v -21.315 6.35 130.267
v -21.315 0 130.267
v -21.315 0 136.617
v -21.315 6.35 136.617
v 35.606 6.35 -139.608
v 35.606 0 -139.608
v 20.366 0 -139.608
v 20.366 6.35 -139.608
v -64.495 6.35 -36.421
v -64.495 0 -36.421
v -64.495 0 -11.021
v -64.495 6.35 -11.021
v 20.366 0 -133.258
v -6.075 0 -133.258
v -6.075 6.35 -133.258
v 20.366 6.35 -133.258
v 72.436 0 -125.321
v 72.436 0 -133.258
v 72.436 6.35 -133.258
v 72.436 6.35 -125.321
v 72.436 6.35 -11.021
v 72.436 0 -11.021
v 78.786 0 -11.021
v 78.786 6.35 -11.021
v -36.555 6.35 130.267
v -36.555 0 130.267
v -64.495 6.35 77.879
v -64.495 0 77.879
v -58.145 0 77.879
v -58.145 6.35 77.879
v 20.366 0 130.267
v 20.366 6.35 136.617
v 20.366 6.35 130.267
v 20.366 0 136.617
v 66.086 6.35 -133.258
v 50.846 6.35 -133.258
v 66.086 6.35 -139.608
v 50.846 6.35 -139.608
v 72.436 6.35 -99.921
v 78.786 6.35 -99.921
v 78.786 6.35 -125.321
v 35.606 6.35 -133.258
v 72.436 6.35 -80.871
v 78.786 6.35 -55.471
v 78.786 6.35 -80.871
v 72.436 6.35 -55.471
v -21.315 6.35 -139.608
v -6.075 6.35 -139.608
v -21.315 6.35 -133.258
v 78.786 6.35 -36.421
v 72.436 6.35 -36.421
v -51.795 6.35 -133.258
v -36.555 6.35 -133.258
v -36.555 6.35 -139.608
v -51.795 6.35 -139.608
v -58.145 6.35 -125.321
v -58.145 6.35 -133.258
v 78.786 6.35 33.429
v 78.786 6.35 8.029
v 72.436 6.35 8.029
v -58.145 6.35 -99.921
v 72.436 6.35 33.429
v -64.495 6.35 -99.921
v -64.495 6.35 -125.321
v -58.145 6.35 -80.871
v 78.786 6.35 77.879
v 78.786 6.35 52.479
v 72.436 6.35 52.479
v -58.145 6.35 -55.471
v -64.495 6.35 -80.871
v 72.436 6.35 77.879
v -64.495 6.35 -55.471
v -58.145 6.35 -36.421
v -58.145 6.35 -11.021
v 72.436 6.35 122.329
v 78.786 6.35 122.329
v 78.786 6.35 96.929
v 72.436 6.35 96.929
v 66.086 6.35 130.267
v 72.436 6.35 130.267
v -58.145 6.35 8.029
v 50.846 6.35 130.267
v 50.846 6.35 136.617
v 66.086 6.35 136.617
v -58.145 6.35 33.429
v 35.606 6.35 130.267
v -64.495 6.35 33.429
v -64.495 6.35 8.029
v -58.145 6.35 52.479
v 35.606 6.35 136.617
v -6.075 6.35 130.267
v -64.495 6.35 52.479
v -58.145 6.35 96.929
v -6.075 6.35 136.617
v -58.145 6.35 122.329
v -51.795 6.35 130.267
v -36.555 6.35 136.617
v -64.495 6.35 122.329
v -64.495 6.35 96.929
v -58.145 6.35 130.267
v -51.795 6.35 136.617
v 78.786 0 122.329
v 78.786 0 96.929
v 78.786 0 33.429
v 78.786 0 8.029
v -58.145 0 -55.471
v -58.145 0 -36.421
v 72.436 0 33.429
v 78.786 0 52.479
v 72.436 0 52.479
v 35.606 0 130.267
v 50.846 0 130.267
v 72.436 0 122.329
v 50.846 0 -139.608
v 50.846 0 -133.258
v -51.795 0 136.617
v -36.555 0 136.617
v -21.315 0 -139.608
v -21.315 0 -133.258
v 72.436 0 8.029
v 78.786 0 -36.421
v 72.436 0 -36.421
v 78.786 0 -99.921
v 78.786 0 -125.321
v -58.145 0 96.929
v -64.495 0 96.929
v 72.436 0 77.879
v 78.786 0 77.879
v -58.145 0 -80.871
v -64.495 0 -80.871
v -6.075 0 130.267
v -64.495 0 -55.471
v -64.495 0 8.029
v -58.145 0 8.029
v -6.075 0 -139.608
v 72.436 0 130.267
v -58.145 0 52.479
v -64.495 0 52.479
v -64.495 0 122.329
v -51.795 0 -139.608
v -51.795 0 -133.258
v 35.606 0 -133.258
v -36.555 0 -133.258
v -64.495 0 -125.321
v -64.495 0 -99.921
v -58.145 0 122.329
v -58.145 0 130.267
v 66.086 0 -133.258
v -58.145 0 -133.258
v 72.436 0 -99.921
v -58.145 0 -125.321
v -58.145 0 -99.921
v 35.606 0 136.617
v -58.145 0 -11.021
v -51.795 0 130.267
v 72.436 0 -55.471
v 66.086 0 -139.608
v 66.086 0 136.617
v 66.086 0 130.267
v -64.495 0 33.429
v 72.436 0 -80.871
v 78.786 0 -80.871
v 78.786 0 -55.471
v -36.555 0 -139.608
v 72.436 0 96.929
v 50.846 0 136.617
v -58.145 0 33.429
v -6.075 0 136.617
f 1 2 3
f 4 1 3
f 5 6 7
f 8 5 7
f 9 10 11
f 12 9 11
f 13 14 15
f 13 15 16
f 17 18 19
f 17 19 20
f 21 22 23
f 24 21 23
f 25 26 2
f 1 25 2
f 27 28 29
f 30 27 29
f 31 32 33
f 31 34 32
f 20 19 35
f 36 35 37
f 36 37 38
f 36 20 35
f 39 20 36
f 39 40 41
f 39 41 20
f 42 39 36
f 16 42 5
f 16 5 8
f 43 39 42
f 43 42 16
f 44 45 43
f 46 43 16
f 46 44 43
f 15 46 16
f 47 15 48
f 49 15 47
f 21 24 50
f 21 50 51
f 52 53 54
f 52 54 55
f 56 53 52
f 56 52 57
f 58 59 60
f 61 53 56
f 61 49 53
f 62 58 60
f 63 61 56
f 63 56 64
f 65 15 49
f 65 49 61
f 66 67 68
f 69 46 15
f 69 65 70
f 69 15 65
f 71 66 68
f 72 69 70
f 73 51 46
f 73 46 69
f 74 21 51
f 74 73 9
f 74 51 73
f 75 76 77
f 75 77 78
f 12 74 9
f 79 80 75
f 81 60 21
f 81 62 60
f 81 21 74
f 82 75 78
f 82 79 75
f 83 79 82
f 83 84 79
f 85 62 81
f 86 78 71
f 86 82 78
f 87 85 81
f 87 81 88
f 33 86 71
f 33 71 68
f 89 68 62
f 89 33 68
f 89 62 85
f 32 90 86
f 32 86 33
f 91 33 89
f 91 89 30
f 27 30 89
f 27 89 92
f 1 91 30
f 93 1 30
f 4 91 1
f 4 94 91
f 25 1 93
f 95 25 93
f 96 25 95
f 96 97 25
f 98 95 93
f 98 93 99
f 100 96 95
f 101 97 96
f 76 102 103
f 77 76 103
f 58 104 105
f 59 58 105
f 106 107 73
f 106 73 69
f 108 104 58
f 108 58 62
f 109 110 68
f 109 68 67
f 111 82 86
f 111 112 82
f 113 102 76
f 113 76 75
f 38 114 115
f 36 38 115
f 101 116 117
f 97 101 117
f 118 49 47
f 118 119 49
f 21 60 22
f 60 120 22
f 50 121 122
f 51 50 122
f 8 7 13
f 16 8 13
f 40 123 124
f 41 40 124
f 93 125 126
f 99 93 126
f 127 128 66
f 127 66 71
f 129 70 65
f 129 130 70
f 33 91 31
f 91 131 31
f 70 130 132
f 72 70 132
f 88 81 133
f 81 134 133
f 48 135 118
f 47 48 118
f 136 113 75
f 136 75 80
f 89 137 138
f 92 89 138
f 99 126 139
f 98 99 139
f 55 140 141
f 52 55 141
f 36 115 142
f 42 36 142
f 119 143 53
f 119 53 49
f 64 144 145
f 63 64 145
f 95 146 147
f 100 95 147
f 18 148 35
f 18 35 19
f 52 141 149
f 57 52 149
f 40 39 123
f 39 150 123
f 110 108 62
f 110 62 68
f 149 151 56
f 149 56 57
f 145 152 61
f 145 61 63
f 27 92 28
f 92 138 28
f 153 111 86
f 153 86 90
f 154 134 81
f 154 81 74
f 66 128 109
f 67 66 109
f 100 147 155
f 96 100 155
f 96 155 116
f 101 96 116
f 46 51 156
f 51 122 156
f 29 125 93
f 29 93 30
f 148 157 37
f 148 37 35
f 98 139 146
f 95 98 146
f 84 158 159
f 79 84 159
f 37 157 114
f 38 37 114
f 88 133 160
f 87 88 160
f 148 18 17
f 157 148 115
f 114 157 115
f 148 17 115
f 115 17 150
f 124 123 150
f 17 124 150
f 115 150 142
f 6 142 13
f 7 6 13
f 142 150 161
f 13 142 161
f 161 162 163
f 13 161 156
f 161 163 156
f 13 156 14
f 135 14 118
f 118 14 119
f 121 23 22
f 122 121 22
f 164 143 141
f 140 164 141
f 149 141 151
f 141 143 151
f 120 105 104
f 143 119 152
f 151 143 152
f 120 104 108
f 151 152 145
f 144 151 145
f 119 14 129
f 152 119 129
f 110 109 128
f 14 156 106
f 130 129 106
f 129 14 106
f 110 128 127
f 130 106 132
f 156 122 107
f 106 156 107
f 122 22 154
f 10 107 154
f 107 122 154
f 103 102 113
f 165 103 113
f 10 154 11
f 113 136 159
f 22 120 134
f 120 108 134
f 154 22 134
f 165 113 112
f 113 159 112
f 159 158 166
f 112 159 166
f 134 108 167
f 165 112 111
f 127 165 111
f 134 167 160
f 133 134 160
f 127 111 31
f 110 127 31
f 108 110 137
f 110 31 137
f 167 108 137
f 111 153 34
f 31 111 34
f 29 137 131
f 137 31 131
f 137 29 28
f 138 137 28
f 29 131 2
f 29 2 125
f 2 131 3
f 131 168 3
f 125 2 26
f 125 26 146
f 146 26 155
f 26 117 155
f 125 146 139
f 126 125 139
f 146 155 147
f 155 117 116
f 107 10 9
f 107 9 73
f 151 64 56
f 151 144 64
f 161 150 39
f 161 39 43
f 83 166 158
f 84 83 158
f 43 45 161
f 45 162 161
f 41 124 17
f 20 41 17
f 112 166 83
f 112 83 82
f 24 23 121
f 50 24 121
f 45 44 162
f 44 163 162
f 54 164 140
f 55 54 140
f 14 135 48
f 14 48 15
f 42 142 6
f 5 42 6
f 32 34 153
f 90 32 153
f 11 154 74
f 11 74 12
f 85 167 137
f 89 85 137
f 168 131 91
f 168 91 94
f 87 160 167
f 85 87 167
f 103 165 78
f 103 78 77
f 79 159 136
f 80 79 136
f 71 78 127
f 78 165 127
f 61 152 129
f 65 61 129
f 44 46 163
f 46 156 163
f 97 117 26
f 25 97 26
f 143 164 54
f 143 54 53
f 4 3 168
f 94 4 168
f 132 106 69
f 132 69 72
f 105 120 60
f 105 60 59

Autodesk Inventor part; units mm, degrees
ref_plane "YZ Plane" through (0, 0, 0) normal (1, 0, 0) x (0, 1, 0)
ref_plane "XZ Plane" through (0, 0, 0) normal (0, 1, 0) x (-1, 0, 0)
ref_plane "XY Plane" through (0, 0, 0) normal (0, 0, 1) x (1, 0, 0)
sketch "Sketch1" plane through (0, 0, 0) normal (0, 1, 0) x (-1, 0, 0)
  line L0 (36.5552, 136.6167) -> (36.5552, 130.2667)
  line L1 (21.3152, 130.2667) -> (21.3152, 136.6167)
  line L2 (58.1452, 96.9292) -> (64.4952, 96.9292)
  line L3 (64.4952, 77.8792) -> (58.1452, 77.8792)
  line L4 (58.1452, 52.4792) -> (64.4952, 52.4792)
  line L5 (64.4952, 33.4292) -> (58.1452, 33.4292)
  line L6 (58.1452, 8.0292) -> (64.4952, 8.0292)
  line L7 (64.4952, -1.4958) -> (-62.2762, -1.4958) construction
  line L8 (-7.1455, 136.6167) -> (-7.1455, -139.6083) construction
  line L9 (58.1452, 96.9292) -> (58.1452, 77.8792)
  line L10 (58.1452, 33.4292) -> (58.1452, 52.4792)
  line L11 (36.5552, 130.2667) -> (21.3152, 130.2667)
  line L12 (-50.8462, 136.6167) -> (-50.8462, 130.2667)
  line L13 (-20.3662, 136.6167) -> (-20.3662, 130.2667)
  line L14 (-35.6062, 130.2667) -> (-35.6062, 136.6167)
  line L15 (-78.7862, 122.3292) -> (-72.4362, 122.3292)
  line L16 (-72.4362, 96.9292) -> (-78.7862, 96.9292)
  line L17 (-78.7862, 77.8792) -> (-72.4362, 77.8792)
  line L18 (-72.4362, 52.4792) -> (-78.7862, 52.4792)
  line L19 (-78.7862, 33.4292) -> (-72.4362, 33.4292)
  line L20 (-72.4362, 8.0292) -> (-78.7862, 8.0292)
  line L21 (-72.4362, 96.9292) -> (-72.4362, 77.8792)
  line L22 (-72.4362, 33.4292) -> (-72.4362, 52.4792)
  line L23 (-50.8462, 130.2667) -> (-35.6062, 130.2667)
  line L24 (36.5552, -139.6083) -> (36.5552, -133.2583)
  line L25 (6.0752, -139.6083) -> (6.0752, -133.2583)
  line L26 (21.3152, -133.2583) -> (21.3152, -139.6083)
  line L27 (64.4952, -125.3208) -> (58.1452, -125.3208)
  line L28 (58.1452, -99.9208) -> (64.4952, -99.9208)
  line L29 (64.4952, -80.8708) -> (58.1452, -80.8708)
  line L30 (58.1452, -55.4708) -> (64.4952, -55.4708)
  line L31 (64.4952, -36.4208) -> (58.1452, -36.4208)
  line L32 (58.1452, -11.0208) -> (64.4952, -11.0208)
  line L33 (-7.1455, -139.6083) -> (-7.1455, 136.6167) construction
  line L34 (58.1452, -99.9208) -> (58.1452, -80.8708)
  line L35 (58.1452, -36.4208) -> (58.1452, -55.4708)
  line L36 (36.5552, -133.2583) -> (21.3152, -133.2583)
  line L37 (-72.4362, -55.4708) -> (-78.7862, -55.4708)
  line L38 (-78.7862, -80.8708) -> (-72.4362, -80.8708)
  line L39 (-72.4362, -99.9208) -> (-72.4362, -80.8708)
  line L40 (-50.8462, -139.6083) -> (-50.8462, -133.2583)
  line L41 (-20.3662, -139.6083) -> (-20.3662, -133.2583)
  line L42 (-35.6062, -133.2583) -> (-35.6062, -139.6083)
  line L43 (-72.4362, -99.9208) -> (-78.7862, -99.9208)
  line L44 (-78.7862, -125.3208) -> (-72.4362, -125.3208)
  line L45 (-50.8462, -133.2583) -> (-35.6062, -133.2583)
  line L46 (-72.4362, -36.4208) -> (-72.4362, -55.4708)
  line L47 (-78.7862, -36.4208) -> (-72.4362, -36.4208)
  line L48 (-72.4362, -11.0208) -> (-78.7862, -11.0208)
  line L49 (51.7952, 136.6167) -> (36.5552, 136.6167)
  line L50 (-20.3662, 136.6167) -> (-35.6062, 136.6167)
  line L51 (-50.8462, 136.6167) -> (-66.0862, 136.6167)
  line L52 (64.4952, 96.9292) -> (64.4952, 122.3292)
  line L53 (64.4952, 52.4792) -> (64.4952, 77.8792)
  line L54 (58.1452, 8.0292) -> (58.1452, -11.0208)
  line L55 (64.4952, 8.0292) -> (64.4952, 33.4292)
  line L56 (64.4952, -36.4208) -> (64.4952, -11.0208)
  line L57 (64.4952, -80.8708) -> (64.4952, -55.4708)
  line L58 (58.1452, -125.3208) -> (58.1452, -133.2583)
  line L59 (-72.4362, -133.2583) -> (-72.4362, -125.3208)
  line L60 (-72.4362, 8.0292) -> (-72.4362, -11.0208)
  line L61 (-72.4362, 122.3292) -> (-72.4362, 130.2667)
  line L62 (-78.7862, 122.3292) -> (-78.7862, 96.9292)
  line L63 (-78.7862, 77.8792) -> (-78.7862, 52.4792)
  line L64 (-78.7862, 33.4292) -> (-78.7862, 8.0292)
  line L65 (-78.7862, -11.0208) -> (-78.7862, -36.4208)
  line L66 (-78.7862, -55.4708) -> (-78.7862, -80.8708)
  line L67 (-78.7862, -99.9208) -> (-78.7862, -125.3208)
  line L68 (64.4952, -125.3208) -> (64.4952, -99.9208)
  line L69 (-66.0862, -139.6083) -> (-50.8462, -139.6083)
  line L70 (6.0752, -133.2583) -> (-20.3662, -133.2583)
  line L71 (-35.6062, -139.6083) -> (-20.3662, -139.6083)
  line L72 (6.0752, -139.6083) -> (21.3152, -139.6083)
  line L73 (36.5552, -139.6083) -> (51.7952, -139.6083)
  line L74 (58.1452, 130.2667) -> (51.7952, 130.2667)
  line L75 (51.7952, 130.2667) -> (51.7952, 136.6167)
  line L76 (-66.0862, 136.6167) -> (-66.0862, 130.2667)
  line L77 (-66.0862, -139.6083) -> (-66.0862, -133.2583)
  line L78 (51.7952, -139.6083) -> (51.7952, -133.2583)
  line L79 (6.0752, 130.2667) -> (-20.3662, 130.2667)
  line L80 (-66.0862, 130.2667) -> (-72.4362, 130.2667)
  line L81 (6.0752, 130.2667) -> (6.0752, 136.6167)
  line L82 (21.3152, 136.6167) -> (6.0752, 136.6167)
  line L83 (58.1452, 122.3292) -> (58.1452, 130.2667)
  line L84 (64.4952, 122.3292) -> (58.1452, 122.3292)
  line L85 (51.7952, -133.2583) -> (58.1452, -133.2583)
  line L86 (-66.0862, -133.2583) -> (-72.4362, -133.2583)
  point P0 (0, 0)
  point P1 (58.1452, 136.6167)
  dimension "d4" = 15.24
  dimension "d7" = 9.525
  dimension "d8" = 19.05
  dimension "d9" = 19.05
  dimension "d10" = 25.4
  dimension "d12" = 25.4
  dimension "d18" = 15.24
  dimension "d25" = 143.2814
  dimension "d27" = 6.35
  dimension "d28" = 15.24
  dimension "d29" = 6.35
  dimension "d30" = 15.24
extrude "Extrusion2" add sketch "Sketch1" along normal blind 6.35
equation "\"d4\" = d3"
equation "\"d8\" = 2 * d7"
equation "\"d9\" = d8"
equation "\"d10\" = d12"
equation "\"d12\" = d11"
equation "\"d30\" = d18"
equation "\"d3\" = 15.24"
equation "\"d11\" = 25.4"
properties part number "Bottom" material "UHMW, White"
